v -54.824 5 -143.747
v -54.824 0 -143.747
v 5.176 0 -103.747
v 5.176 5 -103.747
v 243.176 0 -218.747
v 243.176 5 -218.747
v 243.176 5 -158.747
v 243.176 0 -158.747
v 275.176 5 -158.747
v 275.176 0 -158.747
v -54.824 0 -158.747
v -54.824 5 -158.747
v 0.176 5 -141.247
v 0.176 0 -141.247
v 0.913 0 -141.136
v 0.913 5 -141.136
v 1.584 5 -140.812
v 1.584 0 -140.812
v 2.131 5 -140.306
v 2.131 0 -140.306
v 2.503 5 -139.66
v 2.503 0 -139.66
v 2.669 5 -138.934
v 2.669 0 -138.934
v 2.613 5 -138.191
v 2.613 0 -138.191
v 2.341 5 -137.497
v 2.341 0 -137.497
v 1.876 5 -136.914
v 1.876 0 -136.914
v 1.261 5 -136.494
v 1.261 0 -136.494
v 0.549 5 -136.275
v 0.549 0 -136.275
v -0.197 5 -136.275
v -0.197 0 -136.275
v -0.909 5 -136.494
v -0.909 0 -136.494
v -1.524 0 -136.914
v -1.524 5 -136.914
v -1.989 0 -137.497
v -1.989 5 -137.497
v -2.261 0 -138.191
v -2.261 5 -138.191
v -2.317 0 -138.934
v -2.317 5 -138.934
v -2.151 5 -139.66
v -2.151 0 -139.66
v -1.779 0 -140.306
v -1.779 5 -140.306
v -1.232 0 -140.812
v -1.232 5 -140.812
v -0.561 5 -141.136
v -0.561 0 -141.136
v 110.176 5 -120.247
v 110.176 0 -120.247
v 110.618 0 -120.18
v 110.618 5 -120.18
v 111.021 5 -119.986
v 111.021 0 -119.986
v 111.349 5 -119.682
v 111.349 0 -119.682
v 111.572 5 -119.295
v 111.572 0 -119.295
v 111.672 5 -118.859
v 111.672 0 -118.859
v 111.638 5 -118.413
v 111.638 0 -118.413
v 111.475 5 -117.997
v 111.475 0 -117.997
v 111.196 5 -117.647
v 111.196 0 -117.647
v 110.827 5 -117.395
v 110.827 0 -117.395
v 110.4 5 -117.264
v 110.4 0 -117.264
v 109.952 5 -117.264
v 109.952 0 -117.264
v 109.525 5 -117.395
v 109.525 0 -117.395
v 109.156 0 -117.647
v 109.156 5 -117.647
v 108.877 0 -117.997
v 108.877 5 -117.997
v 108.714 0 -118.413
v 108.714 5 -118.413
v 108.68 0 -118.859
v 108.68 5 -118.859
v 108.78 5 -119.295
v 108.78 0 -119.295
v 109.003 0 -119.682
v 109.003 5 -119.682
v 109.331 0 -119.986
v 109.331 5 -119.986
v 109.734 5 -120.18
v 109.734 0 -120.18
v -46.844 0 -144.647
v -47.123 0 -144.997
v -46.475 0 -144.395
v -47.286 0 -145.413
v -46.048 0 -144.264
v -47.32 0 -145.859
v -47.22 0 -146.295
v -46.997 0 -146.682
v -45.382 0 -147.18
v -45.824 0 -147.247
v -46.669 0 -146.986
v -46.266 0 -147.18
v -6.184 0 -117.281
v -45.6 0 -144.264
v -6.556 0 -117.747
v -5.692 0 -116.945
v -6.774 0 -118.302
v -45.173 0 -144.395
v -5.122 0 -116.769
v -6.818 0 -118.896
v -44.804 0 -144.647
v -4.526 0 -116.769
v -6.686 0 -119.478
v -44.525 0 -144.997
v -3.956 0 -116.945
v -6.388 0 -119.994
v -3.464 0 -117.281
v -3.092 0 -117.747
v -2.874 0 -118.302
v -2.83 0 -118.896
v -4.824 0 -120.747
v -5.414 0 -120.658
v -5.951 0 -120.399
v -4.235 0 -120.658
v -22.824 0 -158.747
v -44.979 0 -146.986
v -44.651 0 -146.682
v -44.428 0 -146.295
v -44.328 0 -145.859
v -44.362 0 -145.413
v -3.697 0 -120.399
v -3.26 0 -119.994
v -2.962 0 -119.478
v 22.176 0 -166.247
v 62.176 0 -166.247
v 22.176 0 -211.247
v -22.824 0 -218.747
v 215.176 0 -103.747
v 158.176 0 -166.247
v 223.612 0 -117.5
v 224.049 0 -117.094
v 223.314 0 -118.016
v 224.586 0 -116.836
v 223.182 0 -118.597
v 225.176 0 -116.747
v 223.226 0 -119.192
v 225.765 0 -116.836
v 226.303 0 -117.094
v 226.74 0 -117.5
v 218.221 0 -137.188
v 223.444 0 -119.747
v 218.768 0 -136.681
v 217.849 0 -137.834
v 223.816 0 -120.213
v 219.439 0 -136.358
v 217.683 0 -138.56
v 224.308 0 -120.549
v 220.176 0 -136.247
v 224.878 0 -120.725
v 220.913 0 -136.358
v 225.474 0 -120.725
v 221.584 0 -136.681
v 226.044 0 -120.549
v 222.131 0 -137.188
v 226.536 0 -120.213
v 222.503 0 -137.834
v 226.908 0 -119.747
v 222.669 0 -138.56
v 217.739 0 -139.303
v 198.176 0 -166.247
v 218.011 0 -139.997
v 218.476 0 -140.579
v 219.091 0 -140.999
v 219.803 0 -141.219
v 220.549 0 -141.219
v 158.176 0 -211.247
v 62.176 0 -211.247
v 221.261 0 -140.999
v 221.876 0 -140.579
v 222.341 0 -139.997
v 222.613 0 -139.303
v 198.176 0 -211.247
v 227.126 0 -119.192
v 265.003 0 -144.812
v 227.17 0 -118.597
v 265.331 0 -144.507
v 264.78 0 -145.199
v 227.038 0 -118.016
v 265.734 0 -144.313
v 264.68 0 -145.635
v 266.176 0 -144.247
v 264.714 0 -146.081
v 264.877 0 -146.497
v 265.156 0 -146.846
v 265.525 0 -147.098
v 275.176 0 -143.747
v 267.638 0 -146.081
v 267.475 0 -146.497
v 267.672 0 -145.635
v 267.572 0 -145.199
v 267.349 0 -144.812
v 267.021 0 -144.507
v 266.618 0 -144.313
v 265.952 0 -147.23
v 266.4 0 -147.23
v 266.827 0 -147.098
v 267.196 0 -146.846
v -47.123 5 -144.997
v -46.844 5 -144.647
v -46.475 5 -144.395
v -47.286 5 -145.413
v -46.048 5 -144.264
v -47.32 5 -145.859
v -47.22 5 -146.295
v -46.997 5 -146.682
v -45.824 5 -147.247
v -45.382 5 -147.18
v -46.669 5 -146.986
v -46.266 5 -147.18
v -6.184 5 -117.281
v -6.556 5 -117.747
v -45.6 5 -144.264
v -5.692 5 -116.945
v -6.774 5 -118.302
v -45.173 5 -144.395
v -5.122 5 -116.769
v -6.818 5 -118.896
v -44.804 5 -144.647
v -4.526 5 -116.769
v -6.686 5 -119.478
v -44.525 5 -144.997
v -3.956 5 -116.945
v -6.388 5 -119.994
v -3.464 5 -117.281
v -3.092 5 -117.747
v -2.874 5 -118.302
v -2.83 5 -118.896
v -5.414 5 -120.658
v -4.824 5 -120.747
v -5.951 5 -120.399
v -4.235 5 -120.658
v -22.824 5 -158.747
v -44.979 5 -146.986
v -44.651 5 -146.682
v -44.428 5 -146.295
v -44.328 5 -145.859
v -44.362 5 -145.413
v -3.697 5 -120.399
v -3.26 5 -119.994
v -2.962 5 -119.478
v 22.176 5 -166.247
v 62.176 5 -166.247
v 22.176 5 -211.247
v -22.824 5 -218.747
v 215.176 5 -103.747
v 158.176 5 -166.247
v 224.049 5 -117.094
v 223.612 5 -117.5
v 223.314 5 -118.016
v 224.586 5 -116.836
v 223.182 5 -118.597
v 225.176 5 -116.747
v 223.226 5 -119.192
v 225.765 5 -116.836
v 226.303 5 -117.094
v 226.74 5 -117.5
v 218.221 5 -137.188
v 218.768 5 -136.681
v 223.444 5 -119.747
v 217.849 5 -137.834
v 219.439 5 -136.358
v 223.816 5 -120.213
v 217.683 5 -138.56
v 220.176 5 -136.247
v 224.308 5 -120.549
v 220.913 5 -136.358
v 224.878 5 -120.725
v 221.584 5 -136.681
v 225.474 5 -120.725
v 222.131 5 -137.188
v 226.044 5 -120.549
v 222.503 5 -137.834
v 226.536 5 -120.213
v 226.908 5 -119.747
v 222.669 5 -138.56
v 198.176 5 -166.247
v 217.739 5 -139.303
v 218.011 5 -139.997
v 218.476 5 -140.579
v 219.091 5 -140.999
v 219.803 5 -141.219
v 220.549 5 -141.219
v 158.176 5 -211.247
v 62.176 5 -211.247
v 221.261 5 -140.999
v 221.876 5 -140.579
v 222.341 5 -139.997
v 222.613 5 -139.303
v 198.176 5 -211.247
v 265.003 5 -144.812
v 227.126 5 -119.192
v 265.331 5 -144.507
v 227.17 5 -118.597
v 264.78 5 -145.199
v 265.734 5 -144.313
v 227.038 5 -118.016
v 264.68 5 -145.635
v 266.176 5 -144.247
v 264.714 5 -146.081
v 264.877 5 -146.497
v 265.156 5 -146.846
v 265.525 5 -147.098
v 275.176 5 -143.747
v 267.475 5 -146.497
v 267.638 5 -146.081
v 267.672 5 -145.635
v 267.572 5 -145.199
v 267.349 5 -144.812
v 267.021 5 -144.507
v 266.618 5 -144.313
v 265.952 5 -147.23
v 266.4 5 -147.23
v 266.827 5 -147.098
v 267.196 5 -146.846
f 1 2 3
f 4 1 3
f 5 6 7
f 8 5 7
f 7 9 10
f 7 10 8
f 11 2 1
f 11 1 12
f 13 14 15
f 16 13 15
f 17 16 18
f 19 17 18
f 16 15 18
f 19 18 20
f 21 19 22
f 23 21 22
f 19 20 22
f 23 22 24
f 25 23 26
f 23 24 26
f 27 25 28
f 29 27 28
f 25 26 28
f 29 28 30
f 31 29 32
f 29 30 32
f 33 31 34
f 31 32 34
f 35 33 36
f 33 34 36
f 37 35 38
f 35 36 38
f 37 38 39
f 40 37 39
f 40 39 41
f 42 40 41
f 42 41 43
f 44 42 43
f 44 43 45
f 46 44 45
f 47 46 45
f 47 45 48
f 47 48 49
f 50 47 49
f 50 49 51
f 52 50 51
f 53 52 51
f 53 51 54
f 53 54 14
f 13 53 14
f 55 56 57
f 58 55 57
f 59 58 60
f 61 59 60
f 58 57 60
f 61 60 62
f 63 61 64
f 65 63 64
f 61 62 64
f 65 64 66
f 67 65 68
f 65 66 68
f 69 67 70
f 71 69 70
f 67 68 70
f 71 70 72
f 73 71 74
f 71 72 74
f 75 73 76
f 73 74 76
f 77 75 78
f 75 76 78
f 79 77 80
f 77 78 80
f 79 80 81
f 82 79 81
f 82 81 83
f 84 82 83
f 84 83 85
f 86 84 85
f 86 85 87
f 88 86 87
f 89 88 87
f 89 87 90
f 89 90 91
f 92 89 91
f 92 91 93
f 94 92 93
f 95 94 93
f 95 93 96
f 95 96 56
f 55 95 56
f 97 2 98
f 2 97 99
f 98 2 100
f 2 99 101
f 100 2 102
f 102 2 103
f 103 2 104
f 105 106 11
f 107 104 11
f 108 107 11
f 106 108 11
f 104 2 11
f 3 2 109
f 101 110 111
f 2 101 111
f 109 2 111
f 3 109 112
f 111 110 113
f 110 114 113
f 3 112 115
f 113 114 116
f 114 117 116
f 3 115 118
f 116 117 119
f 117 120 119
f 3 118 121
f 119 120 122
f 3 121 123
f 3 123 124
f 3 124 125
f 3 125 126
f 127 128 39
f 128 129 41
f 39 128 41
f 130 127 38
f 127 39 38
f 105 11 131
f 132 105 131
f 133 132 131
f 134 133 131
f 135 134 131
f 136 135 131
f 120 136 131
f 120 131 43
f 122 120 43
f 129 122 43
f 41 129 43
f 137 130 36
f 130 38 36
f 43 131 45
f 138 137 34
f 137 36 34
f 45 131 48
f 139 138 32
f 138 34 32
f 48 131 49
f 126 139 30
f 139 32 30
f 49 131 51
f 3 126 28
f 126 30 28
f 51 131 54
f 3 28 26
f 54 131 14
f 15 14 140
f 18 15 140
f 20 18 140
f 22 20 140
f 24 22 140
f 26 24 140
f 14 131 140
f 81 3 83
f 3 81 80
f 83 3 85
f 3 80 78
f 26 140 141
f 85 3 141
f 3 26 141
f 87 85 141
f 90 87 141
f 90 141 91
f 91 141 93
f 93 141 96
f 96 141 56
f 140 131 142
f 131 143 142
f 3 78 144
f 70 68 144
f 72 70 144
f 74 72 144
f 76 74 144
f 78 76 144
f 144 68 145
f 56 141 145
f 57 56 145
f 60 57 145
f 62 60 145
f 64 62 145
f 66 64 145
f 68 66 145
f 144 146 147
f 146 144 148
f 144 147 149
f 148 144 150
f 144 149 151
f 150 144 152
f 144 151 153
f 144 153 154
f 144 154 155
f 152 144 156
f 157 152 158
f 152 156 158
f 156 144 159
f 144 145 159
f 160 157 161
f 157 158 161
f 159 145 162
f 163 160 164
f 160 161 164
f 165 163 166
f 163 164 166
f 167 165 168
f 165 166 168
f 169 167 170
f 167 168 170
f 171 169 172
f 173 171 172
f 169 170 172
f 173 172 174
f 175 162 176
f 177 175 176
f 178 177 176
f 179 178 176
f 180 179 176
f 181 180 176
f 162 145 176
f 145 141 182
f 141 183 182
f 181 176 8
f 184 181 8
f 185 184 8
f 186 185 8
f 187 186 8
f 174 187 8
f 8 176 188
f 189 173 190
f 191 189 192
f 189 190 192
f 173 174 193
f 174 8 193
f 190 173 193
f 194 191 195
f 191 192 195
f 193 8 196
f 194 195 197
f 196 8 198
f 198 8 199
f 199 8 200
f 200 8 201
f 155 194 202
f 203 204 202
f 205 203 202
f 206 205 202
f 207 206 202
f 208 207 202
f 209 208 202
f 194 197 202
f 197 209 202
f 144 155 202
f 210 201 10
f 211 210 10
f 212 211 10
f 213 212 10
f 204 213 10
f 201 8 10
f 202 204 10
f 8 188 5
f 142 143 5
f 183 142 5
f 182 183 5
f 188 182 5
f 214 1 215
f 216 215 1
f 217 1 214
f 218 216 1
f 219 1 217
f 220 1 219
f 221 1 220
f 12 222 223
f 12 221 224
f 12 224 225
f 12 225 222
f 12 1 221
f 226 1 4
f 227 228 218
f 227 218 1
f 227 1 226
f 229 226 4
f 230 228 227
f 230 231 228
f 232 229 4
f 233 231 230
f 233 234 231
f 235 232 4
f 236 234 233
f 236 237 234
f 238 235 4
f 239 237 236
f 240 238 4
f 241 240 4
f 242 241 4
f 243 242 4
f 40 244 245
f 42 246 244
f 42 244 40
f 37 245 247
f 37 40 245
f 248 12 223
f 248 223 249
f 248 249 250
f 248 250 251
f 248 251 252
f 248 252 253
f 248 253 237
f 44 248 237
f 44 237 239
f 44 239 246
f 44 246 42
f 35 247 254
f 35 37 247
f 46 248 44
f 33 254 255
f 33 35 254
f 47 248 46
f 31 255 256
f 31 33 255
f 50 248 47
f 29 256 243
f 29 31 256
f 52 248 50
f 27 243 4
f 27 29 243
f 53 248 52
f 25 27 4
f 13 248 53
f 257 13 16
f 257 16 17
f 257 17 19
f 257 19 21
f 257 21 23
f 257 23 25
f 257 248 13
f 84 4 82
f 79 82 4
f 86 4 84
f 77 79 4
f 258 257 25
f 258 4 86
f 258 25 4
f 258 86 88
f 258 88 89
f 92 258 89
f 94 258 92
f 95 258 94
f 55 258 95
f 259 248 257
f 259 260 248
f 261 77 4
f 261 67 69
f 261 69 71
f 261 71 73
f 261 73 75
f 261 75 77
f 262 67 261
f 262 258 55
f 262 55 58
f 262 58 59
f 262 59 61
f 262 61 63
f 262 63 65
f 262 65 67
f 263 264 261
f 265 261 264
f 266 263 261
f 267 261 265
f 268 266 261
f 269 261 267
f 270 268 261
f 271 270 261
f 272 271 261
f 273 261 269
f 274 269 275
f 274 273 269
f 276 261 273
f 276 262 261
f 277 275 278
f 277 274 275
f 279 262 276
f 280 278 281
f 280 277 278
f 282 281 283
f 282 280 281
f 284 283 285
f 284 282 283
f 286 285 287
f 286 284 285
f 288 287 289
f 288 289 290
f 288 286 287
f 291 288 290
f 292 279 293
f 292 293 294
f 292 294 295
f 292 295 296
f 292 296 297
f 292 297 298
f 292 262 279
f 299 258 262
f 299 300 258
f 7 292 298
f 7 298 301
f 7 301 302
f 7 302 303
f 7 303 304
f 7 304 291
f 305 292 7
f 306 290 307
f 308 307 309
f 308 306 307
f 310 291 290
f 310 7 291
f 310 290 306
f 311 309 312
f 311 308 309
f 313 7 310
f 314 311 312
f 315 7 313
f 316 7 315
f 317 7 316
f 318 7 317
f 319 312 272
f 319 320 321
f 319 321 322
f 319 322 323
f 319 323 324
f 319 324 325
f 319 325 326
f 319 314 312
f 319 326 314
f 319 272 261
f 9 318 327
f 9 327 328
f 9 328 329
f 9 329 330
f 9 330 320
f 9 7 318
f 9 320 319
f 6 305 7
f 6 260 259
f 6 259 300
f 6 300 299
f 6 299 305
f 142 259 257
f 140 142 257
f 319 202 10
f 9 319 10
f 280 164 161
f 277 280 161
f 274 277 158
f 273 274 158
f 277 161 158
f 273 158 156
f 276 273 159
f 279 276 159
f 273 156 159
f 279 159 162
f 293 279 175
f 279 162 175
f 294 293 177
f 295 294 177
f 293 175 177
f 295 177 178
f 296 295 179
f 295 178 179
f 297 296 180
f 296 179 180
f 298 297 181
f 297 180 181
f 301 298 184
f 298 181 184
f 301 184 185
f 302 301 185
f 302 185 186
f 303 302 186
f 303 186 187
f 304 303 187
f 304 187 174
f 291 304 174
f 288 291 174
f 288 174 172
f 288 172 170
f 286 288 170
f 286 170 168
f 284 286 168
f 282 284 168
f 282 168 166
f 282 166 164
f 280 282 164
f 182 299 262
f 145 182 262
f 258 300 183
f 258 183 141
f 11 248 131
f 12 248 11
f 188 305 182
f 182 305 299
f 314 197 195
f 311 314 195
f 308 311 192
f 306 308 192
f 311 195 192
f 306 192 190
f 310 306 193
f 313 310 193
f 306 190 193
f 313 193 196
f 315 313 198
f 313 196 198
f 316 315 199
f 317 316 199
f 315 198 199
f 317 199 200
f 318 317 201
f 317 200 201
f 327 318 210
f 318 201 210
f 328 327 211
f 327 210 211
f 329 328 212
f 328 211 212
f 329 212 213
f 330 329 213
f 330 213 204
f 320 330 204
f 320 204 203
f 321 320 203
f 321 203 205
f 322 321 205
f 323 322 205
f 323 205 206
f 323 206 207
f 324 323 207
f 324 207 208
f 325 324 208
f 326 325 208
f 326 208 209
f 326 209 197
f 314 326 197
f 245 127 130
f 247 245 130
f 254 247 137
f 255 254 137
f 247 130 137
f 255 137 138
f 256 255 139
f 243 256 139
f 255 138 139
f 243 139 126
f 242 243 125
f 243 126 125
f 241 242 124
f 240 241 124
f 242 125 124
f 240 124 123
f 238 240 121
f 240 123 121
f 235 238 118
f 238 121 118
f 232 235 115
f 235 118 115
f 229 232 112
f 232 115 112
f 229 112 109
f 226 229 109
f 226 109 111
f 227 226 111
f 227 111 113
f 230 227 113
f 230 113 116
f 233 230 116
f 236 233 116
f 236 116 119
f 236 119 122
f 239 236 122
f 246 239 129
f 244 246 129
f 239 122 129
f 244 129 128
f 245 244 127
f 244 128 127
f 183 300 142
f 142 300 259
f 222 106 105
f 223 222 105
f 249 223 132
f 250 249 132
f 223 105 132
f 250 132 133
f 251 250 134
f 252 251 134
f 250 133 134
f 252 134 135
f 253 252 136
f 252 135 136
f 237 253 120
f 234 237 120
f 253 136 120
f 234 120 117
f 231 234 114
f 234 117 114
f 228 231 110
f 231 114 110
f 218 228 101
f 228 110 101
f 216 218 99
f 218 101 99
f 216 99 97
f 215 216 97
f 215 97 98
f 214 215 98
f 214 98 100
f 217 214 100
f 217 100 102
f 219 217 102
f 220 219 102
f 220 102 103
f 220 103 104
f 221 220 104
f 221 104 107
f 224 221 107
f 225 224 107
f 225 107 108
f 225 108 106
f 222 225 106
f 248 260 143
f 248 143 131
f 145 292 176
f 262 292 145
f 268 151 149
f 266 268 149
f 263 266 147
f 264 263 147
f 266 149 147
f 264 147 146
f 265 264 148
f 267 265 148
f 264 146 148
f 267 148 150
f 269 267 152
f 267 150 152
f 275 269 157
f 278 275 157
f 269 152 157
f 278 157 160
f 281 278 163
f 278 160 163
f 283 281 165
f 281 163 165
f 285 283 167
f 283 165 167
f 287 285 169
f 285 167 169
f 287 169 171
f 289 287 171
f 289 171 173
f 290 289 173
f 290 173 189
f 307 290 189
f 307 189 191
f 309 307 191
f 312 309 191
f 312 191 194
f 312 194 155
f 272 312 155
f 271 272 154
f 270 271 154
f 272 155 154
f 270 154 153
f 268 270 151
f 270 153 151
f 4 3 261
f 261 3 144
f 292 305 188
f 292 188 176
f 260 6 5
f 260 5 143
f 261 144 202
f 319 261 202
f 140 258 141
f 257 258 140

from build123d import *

# Parameters (mm, degrees)
ESQUISSE1_W             = 330
ESQUISSE1_H             = 250
EXTRUSION1_DEPTH        = 5
ESQUISSE2_W             = 32
ESQUISSE2_H             = 60
ENL_V_MAT_EXTRU_1_DEPTH = 362.087798138
ESQUISSE4_W             = 40
ESQUISSE4_H             = 45
ENL_V_MAT_EXTRU_2_DEPTH = 362.087798138
CHANFREIN1_SIZE         = 15
ESQUISSE5_W             = 330
ESQUISSE5_H             = 5
ENL_V_MAT_EXTRU_3_DEPTH = 15
ENL_V_MAT_EXTRU_5_DEPTH = 352.563639113
ESQUISSE9_R             = 17.5
ENL_V_MAT_EXTRU_6_DEPTH = 352.563639255
SKETCH1_R               = 2
EXTRUDE1_DEPTH          = 5
ESQUISSE10_R            = 2.5
ESQUISSE10_R_2          = 1.5
ENL_V_MAT_EXTRU_7_DEPTH = 6


with BuildPart() as part:
    # Esquisse1 → Extrusion1 (new body)
    with BuildSketch(Plane(origin=(0, 0, 0), x_dir=(1, 0, 0), z_dir=(0, 1, 0))):
        with Locations((110.175955056, 108.746853933)):
            Rectangle(ESQUISSE1_W, ESQUISSE1_H)
    extrude(amount=EXTRUSION1_DEPTH)

    # Esquisse2 → Enlèv. mat.-Extru.1 (cut, through all)
    with BuildSketch(Plane(origin=(0, 5, 0), x_dir=(-1, 0, 0), z_dir=(0, 1, 0))):
        with Locations((38.824044944, -188.746853933)):
            Rectangle(ESQUISSE2_W, ESQUISSE2_H)
        with Locations((-259.175955056, -188.746853933)):
            Rectangle(ESQUISSE2_W, ESQUISSE2_H)
    extrude(amount=-ENL_V_MAT_EXTRU_1_DEPTH, mode=Mode.SUBTRACT)

    # Esquisse4 → Enlèv. mat.-Extru.2 (cut, through all)
    with BuildSketch(Plane(origin=(0, 5, 0), x_dir=(-1, 0, 0), z_dir=(0, 1, 0))):
        with Locations((-178.175955056, -188.746853933)):
            Rectangle(ESQUISSE4_W, ESQUISSE4_H)
        with Locations((-42.175955056, -188.746853933)):
            Rectangle(ESQUISSE4_W, ESQUISSE4_H)
    extrude(amount=-ENL_V_MAT_EXTRU_2_DEPTH, mode=Mode.SUBTRACT)

    # Chanfrein1
    chanfrein1_edges = [part.edges().sort_by_distance(p)[0] for p in [
        (275.175955056, 2.5, 16.253146067),
        (-54.824044944, 2.5, 16.253146067),
    ]]
    chamfer(chanfrein1_edges, length=CHANFREIN1_SIZE)

    # Esquisse5 → Enlèv. mat.-Extru.3 (cut)
    with BuildSketch(Plane(origin=(0, 0, -233.746853933), x_dir=(-1, 0, 0), z_dir=(0, 0, -1))):
        with Locations((-110.175955056, 2.5)):
            Rectangle(ESQUISSE5_W, ESQUISSE5_H)
    extrude(amount=-ENL_V_MAT_EXTRU_3_DEPTH, mode=Mode.SUBTRACT)

    # Esquisse8 → Enlèv. mat.-Extru.5 (cut, through all)
    with BuildSketch(Plane(origin=(0, 5, 0), x_dir=(-1, 0, 0), z_dir=(0, 1, 0))):
        with BuildLine():
            Line((-129.175955056, -33.746853933), (-195.175955056, 16.253146067))
            Line((-195.175955056, 16.253146067), (-25.175955056, 16.253146067))
            Line((-25.175955056, 16.253146067), (-61.175955056, -33.746853933))
            add(Edge.make_bspline(
                [(-95.175955056, -83.746853933), (-72.555573237, -83.746853933), (-61.175955056, -53.90180921), (-61.175955056, -33.746853933)],
                knots=[0, 0, 0, 0, 1, 1, 1, 1], degree=3))
            add(Edge.make_bspline(
                [(-95.175955056, -83.746853933), (-117.796336875, -83.746853933), (-129.175955056, -53.90180921), (-129.175955056, -33.746853933)],
                knots=[0, 0, 0, 0, 1, 1, 1, 1], degree=3))
        make_face()
    extrude(amount=-ENL_V_MAT_EXTRU_5_DEPTH, mode=Mode.SUBTRACT)

    # Esquisse9 → Enlèv. mat.-Extru.6 (cut, through all)
    with BuildSketch(Plane(origin=(0, 5, 0), x_dir=(-1, 0, 0), z_dir=(0, 1, 0))):
        with Locations(Location((-205.175955056, -33.746853933, 0), (0, 0, 90))):
            Circle(ESQUISSE9_R)
        with Locations(Location((-15.175955056, -33.746853933, 0), (0, 0, 90))):
            Circle(ESQUISSE9_R)
    extrude(amount=-ENL_V_MAT_EXTRU_6_DEPTH, mode=Mode.SUBTRACT)

    # Sketch1 → Extrude1 (cut)
    with BuildSketch(Plane.XZ):
        with Locations(Location((-4.824044944, -118.746853933, 0), (0, 0, 270))):
            Circle(SKETCH1_R)
        with Locations(Location((225.175955056, -118.746853933, 0), (0, 0, 90))):
            Circle(SKETCH1_R)
        Polygon((-54.824044944, -143.746853933), (5.175955056, -103.746853933), (215.175955056, -103.746853933), (275.175955056, -143.746853933), (275.175955056, 16.253146067), (-54.824044944, 16.253146067), align=None)
    extrude(amount=-EXTRUDE1_DEPTH, mode=Mode.SUBTRACT)

    # Esquisse10 → Enlèv. mat.-Extru.7 (cut)
    with BuildSketch(Plane.XZ):
        with Locations(Location((0.175955056, -138.746853933, 0), (0, 0, 270))):
            Circle(ESQUISSE10_R)
        with Locations(Location((220.175955056, -138.746853933, 0), (0, 0, 90))):
            Circle(ESQUISSE10_R)
        with Locations(Location((-45.824044944, -145.746853933, 0), (0, 0, 270))):
            Circle(ESQUISSE10_R_2)
        with Locations(Location((266.175955056, -145.746853933, 0), (0, 0, 90))):
            Circle(ESQUISSE10_R_2)
        with Locations(Location((110.175955056, -118.746853933, 0), (0, 0, 270))):
            Circle(ESQUISSE10_R_2)
    extrude(amount=-ENL_V_MAT_EXTRU_7_DEPTH, mode=Mode.SUBTRACT)


solid = part.part
